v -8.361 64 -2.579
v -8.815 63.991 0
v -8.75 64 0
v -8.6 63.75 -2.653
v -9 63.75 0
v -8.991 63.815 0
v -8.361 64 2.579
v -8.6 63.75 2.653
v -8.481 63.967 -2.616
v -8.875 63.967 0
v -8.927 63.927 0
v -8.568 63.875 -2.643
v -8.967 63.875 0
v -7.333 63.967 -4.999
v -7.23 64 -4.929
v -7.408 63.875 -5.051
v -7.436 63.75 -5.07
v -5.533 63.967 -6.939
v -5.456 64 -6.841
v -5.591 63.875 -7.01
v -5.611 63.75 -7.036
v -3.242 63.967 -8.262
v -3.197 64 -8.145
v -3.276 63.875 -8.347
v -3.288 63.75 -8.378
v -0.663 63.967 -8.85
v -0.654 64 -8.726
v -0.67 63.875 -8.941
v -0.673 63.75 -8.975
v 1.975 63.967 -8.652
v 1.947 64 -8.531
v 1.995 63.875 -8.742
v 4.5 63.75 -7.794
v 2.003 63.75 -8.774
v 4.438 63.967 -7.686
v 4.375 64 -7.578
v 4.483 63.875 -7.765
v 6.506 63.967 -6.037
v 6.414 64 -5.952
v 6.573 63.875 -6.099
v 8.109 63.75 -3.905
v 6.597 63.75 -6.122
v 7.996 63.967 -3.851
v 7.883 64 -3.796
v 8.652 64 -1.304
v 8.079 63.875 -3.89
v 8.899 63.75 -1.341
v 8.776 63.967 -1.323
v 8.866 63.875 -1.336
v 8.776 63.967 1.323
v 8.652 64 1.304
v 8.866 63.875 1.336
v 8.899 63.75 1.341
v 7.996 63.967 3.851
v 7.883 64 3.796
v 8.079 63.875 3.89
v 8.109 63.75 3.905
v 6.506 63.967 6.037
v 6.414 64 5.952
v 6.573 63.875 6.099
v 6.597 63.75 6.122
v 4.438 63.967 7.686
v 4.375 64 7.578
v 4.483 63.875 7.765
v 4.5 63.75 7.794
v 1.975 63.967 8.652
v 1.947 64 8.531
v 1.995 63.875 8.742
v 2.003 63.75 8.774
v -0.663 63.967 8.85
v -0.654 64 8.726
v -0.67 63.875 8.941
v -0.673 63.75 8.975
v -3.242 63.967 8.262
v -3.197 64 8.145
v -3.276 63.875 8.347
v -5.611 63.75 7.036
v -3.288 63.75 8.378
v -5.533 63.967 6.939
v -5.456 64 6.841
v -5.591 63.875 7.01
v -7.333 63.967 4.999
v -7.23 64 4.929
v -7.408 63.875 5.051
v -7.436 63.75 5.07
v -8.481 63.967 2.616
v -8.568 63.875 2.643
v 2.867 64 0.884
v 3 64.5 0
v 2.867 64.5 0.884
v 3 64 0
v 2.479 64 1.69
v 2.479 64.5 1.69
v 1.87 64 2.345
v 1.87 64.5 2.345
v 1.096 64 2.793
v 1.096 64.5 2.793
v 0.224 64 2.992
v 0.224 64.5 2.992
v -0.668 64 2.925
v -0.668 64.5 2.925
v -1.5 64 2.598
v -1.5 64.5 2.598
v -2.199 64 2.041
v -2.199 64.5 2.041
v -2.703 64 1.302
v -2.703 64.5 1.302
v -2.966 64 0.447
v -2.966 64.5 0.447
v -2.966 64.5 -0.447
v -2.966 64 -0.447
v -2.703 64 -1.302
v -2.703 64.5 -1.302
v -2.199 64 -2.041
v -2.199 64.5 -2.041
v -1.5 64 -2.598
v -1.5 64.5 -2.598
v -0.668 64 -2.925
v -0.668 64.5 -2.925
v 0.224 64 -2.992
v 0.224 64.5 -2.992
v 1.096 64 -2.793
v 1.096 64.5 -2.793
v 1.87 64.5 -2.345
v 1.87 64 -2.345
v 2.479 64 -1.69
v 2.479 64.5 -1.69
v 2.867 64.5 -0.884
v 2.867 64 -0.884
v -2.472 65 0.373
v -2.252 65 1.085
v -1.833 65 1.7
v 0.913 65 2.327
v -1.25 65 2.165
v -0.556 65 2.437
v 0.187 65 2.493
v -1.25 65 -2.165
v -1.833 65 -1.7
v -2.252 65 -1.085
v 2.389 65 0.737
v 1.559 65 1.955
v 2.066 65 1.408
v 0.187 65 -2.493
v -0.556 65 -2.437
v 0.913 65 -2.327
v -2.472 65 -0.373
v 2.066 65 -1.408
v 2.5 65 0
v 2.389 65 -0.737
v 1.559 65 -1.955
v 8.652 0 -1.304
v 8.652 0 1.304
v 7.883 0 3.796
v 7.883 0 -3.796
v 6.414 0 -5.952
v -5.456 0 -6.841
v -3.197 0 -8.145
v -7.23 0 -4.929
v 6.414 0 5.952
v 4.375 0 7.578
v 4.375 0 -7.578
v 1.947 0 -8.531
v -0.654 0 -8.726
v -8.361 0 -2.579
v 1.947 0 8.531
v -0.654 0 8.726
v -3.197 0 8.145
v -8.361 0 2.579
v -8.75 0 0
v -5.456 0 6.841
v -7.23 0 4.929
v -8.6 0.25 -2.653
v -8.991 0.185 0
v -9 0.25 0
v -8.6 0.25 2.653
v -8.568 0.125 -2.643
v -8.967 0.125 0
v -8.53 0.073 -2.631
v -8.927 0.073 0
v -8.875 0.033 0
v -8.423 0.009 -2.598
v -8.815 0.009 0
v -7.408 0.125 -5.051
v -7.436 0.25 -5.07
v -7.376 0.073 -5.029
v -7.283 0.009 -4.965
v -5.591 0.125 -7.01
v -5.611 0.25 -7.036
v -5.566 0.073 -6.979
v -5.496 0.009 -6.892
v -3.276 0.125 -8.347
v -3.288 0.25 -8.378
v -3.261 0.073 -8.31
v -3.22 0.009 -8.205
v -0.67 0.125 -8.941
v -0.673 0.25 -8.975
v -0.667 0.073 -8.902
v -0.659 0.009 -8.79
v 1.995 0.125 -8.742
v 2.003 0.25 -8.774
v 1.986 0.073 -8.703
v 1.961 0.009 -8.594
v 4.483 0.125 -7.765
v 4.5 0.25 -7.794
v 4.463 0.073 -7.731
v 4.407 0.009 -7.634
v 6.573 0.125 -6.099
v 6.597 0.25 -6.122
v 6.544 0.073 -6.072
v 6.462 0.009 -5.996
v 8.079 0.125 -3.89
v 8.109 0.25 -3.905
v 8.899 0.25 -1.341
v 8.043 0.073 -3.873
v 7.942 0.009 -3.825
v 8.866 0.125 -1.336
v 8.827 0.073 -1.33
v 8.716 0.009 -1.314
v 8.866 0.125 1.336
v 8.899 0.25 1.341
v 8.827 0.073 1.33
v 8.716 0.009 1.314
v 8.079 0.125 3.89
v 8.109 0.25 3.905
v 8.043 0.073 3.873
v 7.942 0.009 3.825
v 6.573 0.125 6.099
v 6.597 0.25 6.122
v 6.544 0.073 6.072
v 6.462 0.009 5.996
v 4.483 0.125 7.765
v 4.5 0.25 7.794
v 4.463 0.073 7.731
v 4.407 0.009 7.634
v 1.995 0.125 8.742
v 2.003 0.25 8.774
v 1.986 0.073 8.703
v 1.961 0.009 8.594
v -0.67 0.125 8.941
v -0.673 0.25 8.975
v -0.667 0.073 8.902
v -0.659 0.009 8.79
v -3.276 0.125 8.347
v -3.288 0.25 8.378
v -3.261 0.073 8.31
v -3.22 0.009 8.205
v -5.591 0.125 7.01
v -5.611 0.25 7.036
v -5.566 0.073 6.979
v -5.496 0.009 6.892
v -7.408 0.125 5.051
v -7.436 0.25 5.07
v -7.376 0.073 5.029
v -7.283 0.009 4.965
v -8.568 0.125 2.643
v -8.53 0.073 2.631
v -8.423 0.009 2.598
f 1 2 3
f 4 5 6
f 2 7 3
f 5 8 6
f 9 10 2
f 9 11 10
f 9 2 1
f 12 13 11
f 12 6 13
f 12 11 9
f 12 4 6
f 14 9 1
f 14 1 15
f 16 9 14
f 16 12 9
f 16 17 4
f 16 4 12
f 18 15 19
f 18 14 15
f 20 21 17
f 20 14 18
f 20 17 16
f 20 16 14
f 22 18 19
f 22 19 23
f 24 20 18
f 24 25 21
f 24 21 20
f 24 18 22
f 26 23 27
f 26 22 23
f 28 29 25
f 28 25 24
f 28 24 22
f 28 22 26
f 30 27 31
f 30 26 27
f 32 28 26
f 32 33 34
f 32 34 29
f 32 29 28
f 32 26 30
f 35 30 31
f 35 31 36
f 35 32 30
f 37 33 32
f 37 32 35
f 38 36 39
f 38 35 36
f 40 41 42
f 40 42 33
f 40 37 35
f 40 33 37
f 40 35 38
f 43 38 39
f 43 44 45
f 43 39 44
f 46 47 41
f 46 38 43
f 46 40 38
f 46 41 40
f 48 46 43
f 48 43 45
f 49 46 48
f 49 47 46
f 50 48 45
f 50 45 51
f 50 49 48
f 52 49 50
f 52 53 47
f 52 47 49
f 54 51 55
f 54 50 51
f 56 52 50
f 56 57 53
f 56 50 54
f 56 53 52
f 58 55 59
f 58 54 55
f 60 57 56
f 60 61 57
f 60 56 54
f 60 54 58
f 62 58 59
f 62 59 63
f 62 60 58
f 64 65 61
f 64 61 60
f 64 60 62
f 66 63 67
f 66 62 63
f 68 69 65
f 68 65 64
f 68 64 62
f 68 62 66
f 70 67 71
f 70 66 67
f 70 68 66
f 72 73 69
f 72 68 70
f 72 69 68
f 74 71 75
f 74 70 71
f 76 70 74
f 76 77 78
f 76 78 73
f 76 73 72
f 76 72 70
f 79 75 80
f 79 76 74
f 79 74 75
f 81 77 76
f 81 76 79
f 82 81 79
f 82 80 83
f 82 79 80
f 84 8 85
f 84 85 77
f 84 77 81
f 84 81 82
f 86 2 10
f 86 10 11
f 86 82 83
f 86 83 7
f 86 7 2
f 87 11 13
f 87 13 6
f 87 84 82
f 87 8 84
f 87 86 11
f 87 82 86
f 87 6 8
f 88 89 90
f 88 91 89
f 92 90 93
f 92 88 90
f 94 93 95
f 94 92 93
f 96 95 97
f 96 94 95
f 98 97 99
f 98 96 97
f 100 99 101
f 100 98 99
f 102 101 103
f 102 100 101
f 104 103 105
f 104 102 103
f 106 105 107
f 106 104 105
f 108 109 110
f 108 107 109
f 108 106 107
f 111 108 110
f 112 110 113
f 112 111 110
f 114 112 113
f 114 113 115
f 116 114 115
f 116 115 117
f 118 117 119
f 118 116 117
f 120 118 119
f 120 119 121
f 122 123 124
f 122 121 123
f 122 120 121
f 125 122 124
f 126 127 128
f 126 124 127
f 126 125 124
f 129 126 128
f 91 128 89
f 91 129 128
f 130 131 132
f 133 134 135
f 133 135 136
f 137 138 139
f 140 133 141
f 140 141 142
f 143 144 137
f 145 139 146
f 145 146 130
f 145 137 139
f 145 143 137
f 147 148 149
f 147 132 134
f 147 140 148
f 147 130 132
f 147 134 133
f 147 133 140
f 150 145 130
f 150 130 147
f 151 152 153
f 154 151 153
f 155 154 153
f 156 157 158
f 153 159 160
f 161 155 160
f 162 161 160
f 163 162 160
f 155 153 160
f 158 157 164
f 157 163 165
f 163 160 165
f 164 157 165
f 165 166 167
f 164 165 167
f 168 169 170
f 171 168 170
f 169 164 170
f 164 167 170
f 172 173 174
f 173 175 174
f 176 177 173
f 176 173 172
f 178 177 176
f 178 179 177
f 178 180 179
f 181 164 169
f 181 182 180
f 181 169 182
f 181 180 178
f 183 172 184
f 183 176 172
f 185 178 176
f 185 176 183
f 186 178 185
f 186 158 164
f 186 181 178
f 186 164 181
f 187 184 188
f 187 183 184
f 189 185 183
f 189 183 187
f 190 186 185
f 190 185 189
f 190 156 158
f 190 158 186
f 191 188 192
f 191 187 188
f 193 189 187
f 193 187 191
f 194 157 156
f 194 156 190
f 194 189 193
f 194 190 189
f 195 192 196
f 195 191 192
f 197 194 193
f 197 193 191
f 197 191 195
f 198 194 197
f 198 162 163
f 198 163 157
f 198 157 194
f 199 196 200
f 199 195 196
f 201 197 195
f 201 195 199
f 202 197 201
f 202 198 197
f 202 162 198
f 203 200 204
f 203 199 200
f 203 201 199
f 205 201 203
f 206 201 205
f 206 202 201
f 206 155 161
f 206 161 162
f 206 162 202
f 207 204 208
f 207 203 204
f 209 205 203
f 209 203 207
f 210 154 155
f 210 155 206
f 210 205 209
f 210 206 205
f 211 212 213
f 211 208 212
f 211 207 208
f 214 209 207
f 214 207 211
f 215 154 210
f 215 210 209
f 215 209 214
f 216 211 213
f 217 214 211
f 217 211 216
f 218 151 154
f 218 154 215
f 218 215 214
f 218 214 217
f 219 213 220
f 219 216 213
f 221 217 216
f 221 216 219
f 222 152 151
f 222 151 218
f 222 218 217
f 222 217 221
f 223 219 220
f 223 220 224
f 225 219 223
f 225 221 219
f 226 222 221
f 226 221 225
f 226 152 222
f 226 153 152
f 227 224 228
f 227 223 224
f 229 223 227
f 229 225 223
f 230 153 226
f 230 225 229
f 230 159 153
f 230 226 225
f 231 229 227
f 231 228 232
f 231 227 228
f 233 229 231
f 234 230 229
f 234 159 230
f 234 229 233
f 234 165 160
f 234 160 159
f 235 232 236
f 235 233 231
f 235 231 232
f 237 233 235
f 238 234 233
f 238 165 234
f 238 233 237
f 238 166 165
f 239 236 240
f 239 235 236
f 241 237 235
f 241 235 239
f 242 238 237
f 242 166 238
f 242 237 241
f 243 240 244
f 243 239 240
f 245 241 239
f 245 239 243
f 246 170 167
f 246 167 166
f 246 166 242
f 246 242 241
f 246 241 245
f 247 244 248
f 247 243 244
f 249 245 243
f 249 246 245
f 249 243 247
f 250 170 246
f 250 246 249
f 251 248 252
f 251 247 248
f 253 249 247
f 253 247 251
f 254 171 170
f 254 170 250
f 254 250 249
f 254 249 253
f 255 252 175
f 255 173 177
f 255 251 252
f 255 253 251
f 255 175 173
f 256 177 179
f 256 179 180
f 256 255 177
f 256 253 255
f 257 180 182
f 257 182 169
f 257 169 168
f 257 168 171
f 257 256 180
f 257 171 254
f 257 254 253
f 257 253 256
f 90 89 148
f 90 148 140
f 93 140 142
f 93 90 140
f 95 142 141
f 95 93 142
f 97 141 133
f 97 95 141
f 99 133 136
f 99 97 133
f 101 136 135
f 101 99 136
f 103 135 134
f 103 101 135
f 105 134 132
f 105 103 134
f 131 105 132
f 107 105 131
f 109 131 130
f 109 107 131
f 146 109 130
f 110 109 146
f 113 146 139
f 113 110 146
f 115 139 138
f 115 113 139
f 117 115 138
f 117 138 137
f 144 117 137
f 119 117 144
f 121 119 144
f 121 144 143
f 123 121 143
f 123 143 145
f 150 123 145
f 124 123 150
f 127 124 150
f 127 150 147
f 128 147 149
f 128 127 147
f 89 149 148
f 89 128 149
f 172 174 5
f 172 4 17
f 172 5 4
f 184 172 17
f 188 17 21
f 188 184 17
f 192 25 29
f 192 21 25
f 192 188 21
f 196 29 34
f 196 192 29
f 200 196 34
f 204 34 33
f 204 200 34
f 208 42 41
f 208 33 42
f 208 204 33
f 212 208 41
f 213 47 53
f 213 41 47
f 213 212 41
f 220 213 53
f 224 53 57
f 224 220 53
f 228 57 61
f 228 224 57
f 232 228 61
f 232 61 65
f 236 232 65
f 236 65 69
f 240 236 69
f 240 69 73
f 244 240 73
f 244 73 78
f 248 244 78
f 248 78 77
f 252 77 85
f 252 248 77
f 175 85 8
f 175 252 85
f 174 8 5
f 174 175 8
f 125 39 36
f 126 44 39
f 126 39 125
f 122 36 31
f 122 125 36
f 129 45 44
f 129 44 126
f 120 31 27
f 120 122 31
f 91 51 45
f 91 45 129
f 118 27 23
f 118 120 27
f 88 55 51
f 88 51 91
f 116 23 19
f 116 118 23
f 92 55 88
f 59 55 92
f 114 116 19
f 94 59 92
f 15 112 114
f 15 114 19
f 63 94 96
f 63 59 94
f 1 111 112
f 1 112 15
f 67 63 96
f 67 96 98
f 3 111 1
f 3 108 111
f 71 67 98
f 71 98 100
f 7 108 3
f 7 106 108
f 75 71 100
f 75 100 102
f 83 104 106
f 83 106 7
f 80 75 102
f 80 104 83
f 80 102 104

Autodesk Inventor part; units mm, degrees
ref_plane "YZ Plane" through (0, 0, 0) normal (1, 0, 0) x (0, 1, 0)
ref_plane "XZ Plane" through (0, 0, 0) normal (0, 1, 0) x (-1, 0, 0)
ref_plane "XY Plane" through (0, 0, 0) normal (0, 0, 1) x (1, 0, 0)
sketch "Sketch1" plane through (0, 0, 0) normal (0, 1, 0) x (-1, 0, 0)
  circle A0 centre (0, 0) radius 9
  dimension "d0" = 18
extrude "Extrusion1" add sketch "Sketch1" along normal blind 64
sketch "Sketch2" plane through (0, 64, 0) normal (0, 1, 0) x (1, 0, 0)
  circle A0 centre (0, 0) radius 9 projected
  circle A1 centre (0, 0) radius 3
  dimension "d3" = 6
extrude "Extrusion2" add sketch "Sketch2" along normal blind 1 contours A1
chamfer "Chamfer1" distance 0.5 angle 45 1 edges at (-3, 65, 0)
fillet "Fillet1" radius 0.25 2 edges at (9, 64, 0) (9, 0, 0)
properties part number "18650" material "Steel"
